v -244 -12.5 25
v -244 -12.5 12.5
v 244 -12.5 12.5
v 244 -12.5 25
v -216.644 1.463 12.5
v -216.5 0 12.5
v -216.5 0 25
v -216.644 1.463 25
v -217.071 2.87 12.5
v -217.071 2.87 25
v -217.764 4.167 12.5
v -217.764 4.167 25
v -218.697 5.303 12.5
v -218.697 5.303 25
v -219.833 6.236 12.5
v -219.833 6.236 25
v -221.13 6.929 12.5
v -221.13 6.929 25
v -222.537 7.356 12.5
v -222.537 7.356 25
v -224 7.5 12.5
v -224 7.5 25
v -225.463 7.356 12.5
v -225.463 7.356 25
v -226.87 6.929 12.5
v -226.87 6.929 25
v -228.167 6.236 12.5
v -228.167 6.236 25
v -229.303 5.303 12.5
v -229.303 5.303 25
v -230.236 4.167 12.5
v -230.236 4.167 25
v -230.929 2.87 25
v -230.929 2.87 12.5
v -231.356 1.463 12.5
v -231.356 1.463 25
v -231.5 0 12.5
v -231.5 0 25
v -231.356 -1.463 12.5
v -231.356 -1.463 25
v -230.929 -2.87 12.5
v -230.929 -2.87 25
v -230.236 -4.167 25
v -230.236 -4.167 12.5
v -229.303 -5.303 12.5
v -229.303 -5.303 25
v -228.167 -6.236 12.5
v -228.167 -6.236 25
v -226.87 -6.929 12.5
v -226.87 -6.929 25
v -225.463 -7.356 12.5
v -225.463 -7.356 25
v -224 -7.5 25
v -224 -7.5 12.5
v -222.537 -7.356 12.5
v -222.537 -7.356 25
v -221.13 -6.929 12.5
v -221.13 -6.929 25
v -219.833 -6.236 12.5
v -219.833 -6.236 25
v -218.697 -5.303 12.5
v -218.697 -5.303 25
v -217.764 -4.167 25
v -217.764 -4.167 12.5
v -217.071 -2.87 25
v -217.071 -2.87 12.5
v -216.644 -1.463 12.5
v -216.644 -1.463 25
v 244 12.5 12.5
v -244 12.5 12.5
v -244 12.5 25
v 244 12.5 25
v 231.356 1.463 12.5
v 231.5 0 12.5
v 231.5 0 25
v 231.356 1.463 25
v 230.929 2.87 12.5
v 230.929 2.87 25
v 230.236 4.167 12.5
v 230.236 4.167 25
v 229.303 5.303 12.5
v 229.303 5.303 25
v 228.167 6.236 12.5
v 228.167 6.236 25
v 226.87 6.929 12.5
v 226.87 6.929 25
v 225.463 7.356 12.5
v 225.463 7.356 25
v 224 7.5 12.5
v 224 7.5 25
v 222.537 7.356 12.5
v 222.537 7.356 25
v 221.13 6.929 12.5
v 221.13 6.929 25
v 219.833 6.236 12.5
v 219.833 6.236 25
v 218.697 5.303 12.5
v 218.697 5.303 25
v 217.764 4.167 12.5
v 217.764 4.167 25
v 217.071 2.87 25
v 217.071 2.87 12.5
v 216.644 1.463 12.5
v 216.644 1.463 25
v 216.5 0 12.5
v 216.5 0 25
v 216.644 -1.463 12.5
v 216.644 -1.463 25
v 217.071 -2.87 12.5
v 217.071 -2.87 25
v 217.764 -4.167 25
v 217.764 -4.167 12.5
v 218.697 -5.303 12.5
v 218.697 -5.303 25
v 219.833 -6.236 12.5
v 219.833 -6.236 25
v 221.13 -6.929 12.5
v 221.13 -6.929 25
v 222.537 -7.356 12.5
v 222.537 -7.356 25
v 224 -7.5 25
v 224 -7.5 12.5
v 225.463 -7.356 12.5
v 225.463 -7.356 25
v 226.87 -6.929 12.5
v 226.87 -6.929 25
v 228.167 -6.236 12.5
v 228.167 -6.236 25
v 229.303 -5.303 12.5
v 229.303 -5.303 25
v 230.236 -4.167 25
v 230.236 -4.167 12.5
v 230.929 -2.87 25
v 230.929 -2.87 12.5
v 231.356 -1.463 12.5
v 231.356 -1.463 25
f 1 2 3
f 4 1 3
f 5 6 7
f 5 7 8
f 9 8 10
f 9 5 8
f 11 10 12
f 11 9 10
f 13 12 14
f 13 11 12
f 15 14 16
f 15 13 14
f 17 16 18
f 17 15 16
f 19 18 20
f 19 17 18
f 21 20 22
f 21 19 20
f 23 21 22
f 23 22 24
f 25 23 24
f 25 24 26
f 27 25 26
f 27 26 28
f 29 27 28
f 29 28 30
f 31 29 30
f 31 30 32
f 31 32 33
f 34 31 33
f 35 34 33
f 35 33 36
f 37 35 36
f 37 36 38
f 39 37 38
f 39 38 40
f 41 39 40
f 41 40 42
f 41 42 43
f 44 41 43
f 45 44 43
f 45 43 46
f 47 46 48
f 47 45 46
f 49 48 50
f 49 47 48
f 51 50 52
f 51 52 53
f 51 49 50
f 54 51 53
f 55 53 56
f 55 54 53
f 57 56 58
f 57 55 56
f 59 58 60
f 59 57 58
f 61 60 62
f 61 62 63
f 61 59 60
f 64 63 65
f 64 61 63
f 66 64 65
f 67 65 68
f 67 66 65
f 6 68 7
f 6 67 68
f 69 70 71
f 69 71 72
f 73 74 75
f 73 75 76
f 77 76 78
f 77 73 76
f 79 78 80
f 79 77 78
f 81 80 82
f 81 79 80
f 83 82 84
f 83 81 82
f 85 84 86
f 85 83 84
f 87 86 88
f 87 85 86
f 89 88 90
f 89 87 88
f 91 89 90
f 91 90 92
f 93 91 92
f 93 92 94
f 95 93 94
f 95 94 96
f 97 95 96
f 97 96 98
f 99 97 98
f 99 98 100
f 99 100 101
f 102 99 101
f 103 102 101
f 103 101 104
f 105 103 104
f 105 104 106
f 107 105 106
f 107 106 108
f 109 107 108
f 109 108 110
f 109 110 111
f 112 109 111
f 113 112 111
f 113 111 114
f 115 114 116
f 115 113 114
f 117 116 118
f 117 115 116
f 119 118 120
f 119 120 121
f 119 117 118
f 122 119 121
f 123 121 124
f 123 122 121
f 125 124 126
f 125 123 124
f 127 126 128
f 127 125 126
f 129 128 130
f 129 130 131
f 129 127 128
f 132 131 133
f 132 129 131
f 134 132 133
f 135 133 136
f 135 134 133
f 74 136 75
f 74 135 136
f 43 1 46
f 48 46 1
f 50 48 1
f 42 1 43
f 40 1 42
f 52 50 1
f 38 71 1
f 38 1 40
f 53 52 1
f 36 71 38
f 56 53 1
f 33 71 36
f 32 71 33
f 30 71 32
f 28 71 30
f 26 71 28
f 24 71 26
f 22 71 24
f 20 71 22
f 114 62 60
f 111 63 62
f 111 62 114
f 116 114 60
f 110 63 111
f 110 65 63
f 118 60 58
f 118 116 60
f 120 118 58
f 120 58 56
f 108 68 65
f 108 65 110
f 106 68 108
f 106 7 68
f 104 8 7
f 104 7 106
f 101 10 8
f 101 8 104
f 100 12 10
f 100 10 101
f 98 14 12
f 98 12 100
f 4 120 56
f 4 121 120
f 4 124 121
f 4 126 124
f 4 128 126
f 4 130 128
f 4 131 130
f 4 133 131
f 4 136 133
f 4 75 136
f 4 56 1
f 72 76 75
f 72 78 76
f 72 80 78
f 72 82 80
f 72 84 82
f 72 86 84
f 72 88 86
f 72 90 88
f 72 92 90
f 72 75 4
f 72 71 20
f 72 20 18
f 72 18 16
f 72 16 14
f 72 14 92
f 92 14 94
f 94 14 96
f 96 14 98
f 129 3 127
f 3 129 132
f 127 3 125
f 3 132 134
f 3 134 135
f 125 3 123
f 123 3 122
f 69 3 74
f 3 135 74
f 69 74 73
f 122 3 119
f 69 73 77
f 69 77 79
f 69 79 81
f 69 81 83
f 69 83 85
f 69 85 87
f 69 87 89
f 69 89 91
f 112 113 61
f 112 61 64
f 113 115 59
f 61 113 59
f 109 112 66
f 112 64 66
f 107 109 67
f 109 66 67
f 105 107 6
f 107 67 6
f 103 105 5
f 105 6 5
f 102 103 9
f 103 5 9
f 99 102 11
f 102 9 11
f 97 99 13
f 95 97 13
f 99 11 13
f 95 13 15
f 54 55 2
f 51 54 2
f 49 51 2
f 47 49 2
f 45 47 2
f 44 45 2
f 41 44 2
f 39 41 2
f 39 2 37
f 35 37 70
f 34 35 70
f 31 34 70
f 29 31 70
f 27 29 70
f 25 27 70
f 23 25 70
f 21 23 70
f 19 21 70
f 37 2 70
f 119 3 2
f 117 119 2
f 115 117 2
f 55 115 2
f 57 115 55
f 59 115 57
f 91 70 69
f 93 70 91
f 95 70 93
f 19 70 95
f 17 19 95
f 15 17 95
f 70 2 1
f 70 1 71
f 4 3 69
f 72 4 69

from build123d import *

# Parameters (mm, degrees)
SKETCH1_W               = 488
SKETCH1_H               = 25
SKETCH1_R               = 7.5
BOSS_EXTRUDE1_DEPTH     = 25
CUT_EXTRUDE1_DEPTH      = 489.799805646
CUT_EXTRUDE1_DEPTH_BACK = 489.799805646
SKETCH2_W               = 12.5
SKETCH2_H               = 25


with BuildPart() as part:
    # Sketch1 → Boss-Extrude1 (new body)
    with BuildSketch(Plane.XY):
        Rectangle(SKETCH1_W, SKETCH1_H)
        with Locations((-224, 0)):
            Circle(SKETCH1_R, mode=Mode.SUBTRACT)
        with Locations((224, 0)):
            Circle(SKETCH1_R, mode=Mode.SUBTRACT)
    extrude(amount=BOSS_EXTRUDE1_DEPTH)

    # Sketch2 → Cut-Extrude1 (cut, two sides: drawn at the far end of the back side and taken through both)
    with BuildSketch(Plane(origin=(244, 0, 0), x_dir=(0, 0, -1), z_dir=(1, 0, 0)).offset(-CUT_EXTRUDE1_DEPTH_BACK)):
        with Locations((-6.25, 0)):
            Rectangle(SKETCH2_W, SKETCH2_H)
    extrude(amount=CUT_EXTRUDE1_DEPTH + CUT_EXTRUDE1_DEPTH_BACK, mode=Mode.SUBTRACT)


solid = part.part
